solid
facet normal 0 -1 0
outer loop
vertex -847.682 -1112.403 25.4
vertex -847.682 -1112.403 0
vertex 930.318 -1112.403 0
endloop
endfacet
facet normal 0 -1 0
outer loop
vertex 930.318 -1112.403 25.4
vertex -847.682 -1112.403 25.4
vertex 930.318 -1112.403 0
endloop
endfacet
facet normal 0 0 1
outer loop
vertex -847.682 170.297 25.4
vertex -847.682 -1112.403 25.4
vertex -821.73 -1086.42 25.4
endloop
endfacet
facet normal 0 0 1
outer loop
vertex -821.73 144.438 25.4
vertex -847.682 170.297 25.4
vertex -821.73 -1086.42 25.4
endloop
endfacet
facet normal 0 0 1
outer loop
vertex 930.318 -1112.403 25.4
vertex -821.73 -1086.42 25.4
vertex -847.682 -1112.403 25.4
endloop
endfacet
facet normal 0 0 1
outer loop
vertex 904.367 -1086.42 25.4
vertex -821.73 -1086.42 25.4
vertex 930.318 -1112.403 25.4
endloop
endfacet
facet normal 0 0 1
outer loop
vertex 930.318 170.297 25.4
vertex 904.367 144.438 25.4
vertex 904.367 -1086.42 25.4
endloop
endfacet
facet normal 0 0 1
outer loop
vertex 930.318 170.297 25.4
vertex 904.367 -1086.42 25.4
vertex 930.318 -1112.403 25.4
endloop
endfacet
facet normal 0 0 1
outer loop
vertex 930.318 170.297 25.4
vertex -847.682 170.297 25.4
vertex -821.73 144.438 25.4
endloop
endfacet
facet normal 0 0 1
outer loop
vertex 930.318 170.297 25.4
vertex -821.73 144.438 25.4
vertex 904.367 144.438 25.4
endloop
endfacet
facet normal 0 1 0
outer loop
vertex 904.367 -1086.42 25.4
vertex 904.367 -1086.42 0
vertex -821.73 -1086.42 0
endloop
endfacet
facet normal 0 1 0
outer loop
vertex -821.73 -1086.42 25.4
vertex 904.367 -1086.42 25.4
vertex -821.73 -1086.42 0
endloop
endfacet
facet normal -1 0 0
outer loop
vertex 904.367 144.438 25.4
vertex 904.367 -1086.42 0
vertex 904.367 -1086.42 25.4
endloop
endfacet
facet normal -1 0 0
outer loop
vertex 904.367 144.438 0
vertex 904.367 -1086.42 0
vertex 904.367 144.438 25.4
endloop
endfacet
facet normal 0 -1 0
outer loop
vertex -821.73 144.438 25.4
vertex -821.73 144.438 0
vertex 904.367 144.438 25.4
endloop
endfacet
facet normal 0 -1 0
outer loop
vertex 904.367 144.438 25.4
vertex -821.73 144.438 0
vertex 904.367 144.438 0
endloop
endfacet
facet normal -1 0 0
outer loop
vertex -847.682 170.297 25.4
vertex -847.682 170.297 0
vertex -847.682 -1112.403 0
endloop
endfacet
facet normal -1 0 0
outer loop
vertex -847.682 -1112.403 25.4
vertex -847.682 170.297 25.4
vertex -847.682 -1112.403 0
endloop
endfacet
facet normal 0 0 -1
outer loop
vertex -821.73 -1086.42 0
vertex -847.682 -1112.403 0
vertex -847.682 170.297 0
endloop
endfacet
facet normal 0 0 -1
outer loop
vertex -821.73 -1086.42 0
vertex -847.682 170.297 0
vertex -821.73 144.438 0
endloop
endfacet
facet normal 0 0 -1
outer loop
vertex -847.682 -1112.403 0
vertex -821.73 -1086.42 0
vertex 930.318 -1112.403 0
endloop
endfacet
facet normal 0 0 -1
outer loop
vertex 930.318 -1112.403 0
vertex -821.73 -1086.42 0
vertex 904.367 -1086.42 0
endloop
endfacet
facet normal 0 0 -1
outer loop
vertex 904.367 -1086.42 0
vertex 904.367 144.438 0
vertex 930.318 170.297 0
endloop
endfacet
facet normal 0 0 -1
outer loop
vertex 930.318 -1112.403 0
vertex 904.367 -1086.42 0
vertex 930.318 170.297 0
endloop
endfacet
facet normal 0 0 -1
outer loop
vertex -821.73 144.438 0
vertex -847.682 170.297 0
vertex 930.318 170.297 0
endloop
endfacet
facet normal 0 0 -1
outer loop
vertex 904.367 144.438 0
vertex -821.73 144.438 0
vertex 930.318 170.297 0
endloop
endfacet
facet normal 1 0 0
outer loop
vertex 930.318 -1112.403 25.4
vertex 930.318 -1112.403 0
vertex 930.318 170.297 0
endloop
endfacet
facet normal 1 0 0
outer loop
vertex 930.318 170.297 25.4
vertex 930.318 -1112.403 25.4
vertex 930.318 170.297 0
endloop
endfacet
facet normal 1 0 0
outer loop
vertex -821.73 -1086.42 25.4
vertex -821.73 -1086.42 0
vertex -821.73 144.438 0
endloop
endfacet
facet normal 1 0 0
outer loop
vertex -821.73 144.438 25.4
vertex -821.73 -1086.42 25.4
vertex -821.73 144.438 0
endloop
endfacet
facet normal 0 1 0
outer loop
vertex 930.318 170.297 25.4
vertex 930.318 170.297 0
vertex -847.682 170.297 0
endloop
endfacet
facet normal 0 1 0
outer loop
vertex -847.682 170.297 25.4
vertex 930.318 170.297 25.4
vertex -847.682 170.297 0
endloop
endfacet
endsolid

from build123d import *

# Parameters (mm, degrees)
F0_W     = 25.9512081146
F0_H     = 25.8589489582
F0_W_2   = 292.5098538399
F0_H_2   = 1230.8580875397
F0_W_3   = 26.0652303696
F0_H_3   = 25.9829635022
F0_W_4   = 26.0652527213
F0_W_5   = 779.060781002
F1_DEPTH = 25.4


with BuildPart() as f1:
    # F0 (on Top) → F1 (new body)
    with BuildSketch(Plane.XY):
        with Locations((-834.7059197426, 157.3672643961)):
            Rectangle(F0_W, F0_H)
        with Locations((-675.4753887653, 157.3672643961)):
            Rectangle(F0_W_2, F0_H)
        with Locations((-834.7059197426, -470.9912538528)):
            Rectangle(F0_W, F0_H_2)
        with Locations((-516.1878466606, 157.3672643961)):
            Rectangle(F0_W_3, F0_H)
        with Locations((-834.7059197426, -1099.4117793738)):
            Rectangle(F0_W, F0_H_3)
        Polygon((99.2412343621, 170.2967388751), (-503.1552314758, 170.2967388751), (-503.1552314758, 144.437789917), (-225.1261025667, 144.437789917), (-199.060857296, 144.437789917), (99.2412343621, 144.437789917), align=None)
        with Locations((-675.4753887653, -1099.4117793738)):
            Rectangle(F0_W_2, F0_H_3)
        with Locations((112.2738607228, 157.3672643961)):
            Rectangle(F0_W_4, F0_H)
        with Locations((-516.1878466606, -1099.4117793738)):
            Rectangle(F0_W_3, F0_H_3)
        with Locations((514.8368775845, 157.3672643961)):
            Rectangle(F0_W_5, F0_H)
        Polygon((-225.1261025667, -1086.4202976227), (-503.1552314758, -1086.4202976227), (-503.1552314758, -1112.4032611249), (99.2412343621, -1112.4032611249), (99.2412343621, -1086.4202976227), (-199.060857296, -1086.4202976227), align=None)
        with Locations((917.3428721428, 157.3672643961)):
            Rectangle(F0_W, F0_H)
        with Locations((112.2738607228, -1099.4117793738)):
            Rectangle(F0_W_4, F0_H_3)
        with Locations((917.3428721428, -470.9912538528)):
            Rectangle(F0_W, F0_H_2)
        with Locations((514.8368775845, -1099.4117793738)):
            Rectangle(F0_W_5, F0_H_3)
        with Locations((917.3428721428, -1099.4117793738)):
            Rectangle(F0_W, F0_H_3)
    extrude(amount=F1_DEPTH)


solid = f1.part
